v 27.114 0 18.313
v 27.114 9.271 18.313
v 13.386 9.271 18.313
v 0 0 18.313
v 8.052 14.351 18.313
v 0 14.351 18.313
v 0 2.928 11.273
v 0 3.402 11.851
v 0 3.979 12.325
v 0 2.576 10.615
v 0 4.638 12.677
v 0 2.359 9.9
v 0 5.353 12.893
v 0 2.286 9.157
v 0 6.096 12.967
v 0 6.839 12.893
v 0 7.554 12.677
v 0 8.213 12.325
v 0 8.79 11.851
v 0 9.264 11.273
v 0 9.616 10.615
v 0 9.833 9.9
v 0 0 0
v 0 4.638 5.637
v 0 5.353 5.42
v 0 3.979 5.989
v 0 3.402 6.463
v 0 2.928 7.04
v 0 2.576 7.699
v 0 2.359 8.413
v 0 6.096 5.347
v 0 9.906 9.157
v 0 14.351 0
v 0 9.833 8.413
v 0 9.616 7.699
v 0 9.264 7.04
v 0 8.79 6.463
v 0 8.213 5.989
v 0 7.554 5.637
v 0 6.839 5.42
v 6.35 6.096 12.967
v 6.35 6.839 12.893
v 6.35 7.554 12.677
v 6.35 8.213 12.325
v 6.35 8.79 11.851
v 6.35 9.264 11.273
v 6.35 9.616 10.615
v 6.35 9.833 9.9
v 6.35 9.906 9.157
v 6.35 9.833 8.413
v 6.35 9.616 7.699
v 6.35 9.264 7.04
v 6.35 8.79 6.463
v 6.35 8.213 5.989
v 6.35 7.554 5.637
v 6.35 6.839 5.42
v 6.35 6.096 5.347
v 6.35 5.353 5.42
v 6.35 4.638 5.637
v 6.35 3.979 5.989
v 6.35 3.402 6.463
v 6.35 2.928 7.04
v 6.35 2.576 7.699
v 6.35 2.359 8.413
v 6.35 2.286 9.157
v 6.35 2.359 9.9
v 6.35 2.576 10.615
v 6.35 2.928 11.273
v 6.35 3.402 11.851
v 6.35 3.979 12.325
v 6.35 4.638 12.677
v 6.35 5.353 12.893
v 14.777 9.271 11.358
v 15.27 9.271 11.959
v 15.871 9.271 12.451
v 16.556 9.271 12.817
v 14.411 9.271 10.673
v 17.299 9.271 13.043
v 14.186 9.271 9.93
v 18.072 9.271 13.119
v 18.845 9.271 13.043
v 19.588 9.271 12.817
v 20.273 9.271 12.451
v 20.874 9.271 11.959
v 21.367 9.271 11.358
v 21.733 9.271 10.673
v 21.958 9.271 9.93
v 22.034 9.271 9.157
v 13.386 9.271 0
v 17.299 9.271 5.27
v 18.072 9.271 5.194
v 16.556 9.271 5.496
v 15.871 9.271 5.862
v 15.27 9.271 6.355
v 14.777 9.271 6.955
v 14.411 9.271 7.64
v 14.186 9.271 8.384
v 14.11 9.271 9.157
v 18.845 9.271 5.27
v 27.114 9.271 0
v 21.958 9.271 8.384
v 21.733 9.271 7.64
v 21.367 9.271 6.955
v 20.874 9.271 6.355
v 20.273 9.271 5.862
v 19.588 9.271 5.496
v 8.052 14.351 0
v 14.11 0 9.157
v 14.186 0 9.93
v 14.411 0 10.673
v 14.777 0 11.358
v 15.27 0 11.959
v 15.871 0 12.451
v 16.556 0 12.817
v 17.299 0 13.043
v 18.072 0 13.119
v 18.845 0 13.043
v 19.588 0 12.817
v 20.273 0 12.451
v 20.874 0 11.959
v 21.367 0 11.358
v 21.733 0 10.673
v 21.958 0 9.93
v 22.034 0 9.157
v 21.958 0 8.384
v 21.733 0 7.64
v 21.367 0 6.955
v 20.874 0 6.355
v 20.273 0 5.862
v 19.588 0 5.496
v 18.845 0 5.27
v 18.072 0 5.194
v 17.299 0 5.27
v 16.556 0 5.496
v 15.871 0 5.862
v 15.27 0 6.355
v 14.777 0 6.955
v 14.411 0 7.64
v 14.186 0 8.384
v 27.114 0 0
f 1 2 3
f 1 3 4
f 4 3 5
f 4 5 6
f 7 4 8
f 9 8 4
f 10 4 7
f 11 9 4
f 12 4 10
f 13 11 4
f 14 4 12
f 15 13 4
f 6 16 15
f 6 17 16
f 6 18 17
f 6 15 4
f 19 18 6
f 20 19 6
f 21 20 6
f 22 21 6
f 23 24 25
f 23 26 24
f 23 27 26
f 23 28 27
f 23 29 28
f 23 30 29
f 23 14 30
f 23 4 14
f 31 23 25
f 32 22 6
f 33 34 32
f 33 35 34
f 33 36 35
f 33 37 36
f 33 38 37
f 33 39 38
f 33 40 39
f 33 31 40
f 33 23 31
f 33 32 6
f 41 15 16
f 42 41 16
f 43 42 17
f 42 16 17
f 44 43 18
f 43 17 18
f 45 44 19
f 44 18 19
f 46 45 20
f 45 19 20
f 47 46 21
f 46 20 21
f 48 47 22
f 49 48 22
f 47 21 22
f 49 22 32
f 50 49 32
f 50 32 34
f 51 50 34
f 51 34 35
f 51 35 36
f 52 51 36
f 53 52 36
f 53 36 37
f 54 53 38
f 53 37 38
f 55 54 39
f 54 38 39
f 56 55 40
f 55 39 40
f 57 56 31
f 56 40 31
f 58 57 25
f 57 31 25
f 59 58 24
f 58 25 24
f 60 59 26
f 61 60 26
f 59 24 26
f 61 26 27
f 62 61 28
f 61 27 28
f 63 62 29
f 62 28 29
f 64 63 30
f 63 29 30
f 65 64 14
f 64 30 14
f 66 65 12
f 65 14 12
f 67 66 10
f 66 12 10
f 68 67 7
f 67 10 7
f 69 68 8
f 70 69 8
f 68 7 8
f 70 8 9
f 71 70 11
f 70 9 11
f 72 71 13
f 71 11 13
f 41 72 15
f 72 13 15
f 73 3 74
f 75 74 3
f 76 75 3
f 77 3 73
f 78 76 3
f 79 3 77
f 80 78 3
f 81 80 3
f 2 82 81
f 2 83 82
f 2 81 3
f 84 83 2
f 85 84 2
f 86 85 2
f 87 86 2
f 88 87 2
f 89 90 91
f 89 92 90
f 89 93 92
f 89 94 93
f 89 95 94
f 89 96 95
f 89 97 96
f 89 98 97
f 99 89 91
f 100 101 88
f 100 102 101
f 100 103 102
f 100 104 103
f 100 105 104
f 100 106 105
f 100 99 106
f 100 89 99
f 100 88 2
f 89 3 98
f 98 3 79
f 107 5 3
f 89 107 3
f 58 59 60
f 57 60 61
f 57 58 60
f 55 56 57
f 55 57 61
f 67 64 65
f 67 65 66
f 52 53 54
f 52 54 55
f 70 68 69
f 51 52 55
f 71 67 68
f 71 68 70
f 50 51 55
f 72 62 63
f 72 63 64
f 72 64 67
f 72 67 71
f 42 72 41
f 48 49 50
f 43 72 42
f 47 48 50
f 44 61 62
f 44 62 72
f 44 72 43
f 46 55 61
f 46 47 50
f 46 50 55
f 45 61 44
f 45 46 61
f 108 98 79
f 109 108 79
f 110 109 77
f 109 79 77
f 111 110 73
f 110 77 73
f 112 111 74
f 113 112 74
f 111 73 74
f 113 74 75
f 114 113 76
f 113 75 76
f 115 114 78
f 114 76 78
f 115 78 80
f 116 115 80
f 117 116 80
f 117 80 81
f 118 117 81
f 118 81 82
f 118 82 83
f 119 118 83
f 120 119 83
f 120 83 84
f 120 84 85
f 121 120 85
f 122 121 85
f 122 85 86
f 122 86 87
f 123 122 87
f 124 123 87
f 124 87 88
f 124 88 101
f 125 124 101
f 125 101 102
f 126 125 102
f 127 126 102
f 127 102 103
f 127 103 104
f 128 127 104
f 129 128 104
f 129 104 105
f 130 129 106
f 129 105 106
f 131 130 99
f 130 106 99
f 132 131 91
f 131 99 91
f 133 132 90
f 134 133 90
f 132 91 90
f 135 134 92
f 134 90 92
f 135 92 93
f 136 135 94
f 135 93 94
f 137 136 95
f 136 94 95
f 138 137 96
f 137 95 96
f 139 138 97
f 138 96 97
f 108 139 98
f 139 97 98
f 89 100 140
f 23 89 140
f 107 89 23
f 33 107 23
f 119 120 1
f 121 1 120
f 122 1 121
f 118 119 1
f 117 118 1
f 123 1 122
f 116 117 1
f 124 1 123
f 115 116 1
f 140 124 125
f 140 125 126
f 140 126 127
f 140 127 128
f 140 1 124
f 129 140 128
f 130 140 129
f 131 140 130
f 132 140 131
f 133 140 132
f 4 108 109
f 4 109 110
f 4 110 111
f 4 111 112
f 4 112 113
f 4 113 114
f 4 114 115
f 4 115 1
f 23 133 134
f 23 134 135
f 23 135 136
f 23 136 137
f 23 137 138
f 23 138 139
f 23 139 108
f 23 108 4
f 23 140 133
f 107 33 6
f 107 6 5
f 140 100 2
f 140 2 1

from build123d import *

# Parameters (mm, degrees)
BOSS_EXTRUDE1_DEPTH = 18.3134
SKETCH2_R           = 3.9624
CUT_EXTRUDE1_DEPTH  = 10.271
SKETCH3_R           = 3.81
CUT_EXTRUDE2_DEPTH  = 6.35


with BuildPart() as part:
    # Sketch1 → Boss-Extrude1 (new body)
    with BuildSketch(Plane.XY):
        Polygon((0, 0), (0, 14.351), (8.0518, 14.351), (13.3858, 9.271), (27.1145, 9.271), (27.1145, 0), align=None)
    extrude(amount=BOSS_EXTRUDE1_DEPTH)

    # Sketch2 → Cut-Extrude1 (cut, through all)
    with BuildSketch(Plane(origin=(0, 9.271, 0), x_dir=(1, 0, 0), z_dir=(0, 1, 0))):
        with Locations(Location((18.0721, -9.1567, 0), (0, 0, 180))):  # turned: the seam where the file's is
            Circle(SKETCH2_R)
    extrude(amount=-CUT_EXTRUDE1_DEPTH, mode=Mode.SUBTRACT)

    # Sketch3 → Cut-Extrude2 (cut)
    with BuildSketch(Plane.ZY):
        with Locations((9.1567, 6.096)):
            Circle(SKETCH3_R)
    extrude(amount=-CUT_EXTRUDE2_DEPTH, mode=Mode.SUBTRACT)


solid = part.part
